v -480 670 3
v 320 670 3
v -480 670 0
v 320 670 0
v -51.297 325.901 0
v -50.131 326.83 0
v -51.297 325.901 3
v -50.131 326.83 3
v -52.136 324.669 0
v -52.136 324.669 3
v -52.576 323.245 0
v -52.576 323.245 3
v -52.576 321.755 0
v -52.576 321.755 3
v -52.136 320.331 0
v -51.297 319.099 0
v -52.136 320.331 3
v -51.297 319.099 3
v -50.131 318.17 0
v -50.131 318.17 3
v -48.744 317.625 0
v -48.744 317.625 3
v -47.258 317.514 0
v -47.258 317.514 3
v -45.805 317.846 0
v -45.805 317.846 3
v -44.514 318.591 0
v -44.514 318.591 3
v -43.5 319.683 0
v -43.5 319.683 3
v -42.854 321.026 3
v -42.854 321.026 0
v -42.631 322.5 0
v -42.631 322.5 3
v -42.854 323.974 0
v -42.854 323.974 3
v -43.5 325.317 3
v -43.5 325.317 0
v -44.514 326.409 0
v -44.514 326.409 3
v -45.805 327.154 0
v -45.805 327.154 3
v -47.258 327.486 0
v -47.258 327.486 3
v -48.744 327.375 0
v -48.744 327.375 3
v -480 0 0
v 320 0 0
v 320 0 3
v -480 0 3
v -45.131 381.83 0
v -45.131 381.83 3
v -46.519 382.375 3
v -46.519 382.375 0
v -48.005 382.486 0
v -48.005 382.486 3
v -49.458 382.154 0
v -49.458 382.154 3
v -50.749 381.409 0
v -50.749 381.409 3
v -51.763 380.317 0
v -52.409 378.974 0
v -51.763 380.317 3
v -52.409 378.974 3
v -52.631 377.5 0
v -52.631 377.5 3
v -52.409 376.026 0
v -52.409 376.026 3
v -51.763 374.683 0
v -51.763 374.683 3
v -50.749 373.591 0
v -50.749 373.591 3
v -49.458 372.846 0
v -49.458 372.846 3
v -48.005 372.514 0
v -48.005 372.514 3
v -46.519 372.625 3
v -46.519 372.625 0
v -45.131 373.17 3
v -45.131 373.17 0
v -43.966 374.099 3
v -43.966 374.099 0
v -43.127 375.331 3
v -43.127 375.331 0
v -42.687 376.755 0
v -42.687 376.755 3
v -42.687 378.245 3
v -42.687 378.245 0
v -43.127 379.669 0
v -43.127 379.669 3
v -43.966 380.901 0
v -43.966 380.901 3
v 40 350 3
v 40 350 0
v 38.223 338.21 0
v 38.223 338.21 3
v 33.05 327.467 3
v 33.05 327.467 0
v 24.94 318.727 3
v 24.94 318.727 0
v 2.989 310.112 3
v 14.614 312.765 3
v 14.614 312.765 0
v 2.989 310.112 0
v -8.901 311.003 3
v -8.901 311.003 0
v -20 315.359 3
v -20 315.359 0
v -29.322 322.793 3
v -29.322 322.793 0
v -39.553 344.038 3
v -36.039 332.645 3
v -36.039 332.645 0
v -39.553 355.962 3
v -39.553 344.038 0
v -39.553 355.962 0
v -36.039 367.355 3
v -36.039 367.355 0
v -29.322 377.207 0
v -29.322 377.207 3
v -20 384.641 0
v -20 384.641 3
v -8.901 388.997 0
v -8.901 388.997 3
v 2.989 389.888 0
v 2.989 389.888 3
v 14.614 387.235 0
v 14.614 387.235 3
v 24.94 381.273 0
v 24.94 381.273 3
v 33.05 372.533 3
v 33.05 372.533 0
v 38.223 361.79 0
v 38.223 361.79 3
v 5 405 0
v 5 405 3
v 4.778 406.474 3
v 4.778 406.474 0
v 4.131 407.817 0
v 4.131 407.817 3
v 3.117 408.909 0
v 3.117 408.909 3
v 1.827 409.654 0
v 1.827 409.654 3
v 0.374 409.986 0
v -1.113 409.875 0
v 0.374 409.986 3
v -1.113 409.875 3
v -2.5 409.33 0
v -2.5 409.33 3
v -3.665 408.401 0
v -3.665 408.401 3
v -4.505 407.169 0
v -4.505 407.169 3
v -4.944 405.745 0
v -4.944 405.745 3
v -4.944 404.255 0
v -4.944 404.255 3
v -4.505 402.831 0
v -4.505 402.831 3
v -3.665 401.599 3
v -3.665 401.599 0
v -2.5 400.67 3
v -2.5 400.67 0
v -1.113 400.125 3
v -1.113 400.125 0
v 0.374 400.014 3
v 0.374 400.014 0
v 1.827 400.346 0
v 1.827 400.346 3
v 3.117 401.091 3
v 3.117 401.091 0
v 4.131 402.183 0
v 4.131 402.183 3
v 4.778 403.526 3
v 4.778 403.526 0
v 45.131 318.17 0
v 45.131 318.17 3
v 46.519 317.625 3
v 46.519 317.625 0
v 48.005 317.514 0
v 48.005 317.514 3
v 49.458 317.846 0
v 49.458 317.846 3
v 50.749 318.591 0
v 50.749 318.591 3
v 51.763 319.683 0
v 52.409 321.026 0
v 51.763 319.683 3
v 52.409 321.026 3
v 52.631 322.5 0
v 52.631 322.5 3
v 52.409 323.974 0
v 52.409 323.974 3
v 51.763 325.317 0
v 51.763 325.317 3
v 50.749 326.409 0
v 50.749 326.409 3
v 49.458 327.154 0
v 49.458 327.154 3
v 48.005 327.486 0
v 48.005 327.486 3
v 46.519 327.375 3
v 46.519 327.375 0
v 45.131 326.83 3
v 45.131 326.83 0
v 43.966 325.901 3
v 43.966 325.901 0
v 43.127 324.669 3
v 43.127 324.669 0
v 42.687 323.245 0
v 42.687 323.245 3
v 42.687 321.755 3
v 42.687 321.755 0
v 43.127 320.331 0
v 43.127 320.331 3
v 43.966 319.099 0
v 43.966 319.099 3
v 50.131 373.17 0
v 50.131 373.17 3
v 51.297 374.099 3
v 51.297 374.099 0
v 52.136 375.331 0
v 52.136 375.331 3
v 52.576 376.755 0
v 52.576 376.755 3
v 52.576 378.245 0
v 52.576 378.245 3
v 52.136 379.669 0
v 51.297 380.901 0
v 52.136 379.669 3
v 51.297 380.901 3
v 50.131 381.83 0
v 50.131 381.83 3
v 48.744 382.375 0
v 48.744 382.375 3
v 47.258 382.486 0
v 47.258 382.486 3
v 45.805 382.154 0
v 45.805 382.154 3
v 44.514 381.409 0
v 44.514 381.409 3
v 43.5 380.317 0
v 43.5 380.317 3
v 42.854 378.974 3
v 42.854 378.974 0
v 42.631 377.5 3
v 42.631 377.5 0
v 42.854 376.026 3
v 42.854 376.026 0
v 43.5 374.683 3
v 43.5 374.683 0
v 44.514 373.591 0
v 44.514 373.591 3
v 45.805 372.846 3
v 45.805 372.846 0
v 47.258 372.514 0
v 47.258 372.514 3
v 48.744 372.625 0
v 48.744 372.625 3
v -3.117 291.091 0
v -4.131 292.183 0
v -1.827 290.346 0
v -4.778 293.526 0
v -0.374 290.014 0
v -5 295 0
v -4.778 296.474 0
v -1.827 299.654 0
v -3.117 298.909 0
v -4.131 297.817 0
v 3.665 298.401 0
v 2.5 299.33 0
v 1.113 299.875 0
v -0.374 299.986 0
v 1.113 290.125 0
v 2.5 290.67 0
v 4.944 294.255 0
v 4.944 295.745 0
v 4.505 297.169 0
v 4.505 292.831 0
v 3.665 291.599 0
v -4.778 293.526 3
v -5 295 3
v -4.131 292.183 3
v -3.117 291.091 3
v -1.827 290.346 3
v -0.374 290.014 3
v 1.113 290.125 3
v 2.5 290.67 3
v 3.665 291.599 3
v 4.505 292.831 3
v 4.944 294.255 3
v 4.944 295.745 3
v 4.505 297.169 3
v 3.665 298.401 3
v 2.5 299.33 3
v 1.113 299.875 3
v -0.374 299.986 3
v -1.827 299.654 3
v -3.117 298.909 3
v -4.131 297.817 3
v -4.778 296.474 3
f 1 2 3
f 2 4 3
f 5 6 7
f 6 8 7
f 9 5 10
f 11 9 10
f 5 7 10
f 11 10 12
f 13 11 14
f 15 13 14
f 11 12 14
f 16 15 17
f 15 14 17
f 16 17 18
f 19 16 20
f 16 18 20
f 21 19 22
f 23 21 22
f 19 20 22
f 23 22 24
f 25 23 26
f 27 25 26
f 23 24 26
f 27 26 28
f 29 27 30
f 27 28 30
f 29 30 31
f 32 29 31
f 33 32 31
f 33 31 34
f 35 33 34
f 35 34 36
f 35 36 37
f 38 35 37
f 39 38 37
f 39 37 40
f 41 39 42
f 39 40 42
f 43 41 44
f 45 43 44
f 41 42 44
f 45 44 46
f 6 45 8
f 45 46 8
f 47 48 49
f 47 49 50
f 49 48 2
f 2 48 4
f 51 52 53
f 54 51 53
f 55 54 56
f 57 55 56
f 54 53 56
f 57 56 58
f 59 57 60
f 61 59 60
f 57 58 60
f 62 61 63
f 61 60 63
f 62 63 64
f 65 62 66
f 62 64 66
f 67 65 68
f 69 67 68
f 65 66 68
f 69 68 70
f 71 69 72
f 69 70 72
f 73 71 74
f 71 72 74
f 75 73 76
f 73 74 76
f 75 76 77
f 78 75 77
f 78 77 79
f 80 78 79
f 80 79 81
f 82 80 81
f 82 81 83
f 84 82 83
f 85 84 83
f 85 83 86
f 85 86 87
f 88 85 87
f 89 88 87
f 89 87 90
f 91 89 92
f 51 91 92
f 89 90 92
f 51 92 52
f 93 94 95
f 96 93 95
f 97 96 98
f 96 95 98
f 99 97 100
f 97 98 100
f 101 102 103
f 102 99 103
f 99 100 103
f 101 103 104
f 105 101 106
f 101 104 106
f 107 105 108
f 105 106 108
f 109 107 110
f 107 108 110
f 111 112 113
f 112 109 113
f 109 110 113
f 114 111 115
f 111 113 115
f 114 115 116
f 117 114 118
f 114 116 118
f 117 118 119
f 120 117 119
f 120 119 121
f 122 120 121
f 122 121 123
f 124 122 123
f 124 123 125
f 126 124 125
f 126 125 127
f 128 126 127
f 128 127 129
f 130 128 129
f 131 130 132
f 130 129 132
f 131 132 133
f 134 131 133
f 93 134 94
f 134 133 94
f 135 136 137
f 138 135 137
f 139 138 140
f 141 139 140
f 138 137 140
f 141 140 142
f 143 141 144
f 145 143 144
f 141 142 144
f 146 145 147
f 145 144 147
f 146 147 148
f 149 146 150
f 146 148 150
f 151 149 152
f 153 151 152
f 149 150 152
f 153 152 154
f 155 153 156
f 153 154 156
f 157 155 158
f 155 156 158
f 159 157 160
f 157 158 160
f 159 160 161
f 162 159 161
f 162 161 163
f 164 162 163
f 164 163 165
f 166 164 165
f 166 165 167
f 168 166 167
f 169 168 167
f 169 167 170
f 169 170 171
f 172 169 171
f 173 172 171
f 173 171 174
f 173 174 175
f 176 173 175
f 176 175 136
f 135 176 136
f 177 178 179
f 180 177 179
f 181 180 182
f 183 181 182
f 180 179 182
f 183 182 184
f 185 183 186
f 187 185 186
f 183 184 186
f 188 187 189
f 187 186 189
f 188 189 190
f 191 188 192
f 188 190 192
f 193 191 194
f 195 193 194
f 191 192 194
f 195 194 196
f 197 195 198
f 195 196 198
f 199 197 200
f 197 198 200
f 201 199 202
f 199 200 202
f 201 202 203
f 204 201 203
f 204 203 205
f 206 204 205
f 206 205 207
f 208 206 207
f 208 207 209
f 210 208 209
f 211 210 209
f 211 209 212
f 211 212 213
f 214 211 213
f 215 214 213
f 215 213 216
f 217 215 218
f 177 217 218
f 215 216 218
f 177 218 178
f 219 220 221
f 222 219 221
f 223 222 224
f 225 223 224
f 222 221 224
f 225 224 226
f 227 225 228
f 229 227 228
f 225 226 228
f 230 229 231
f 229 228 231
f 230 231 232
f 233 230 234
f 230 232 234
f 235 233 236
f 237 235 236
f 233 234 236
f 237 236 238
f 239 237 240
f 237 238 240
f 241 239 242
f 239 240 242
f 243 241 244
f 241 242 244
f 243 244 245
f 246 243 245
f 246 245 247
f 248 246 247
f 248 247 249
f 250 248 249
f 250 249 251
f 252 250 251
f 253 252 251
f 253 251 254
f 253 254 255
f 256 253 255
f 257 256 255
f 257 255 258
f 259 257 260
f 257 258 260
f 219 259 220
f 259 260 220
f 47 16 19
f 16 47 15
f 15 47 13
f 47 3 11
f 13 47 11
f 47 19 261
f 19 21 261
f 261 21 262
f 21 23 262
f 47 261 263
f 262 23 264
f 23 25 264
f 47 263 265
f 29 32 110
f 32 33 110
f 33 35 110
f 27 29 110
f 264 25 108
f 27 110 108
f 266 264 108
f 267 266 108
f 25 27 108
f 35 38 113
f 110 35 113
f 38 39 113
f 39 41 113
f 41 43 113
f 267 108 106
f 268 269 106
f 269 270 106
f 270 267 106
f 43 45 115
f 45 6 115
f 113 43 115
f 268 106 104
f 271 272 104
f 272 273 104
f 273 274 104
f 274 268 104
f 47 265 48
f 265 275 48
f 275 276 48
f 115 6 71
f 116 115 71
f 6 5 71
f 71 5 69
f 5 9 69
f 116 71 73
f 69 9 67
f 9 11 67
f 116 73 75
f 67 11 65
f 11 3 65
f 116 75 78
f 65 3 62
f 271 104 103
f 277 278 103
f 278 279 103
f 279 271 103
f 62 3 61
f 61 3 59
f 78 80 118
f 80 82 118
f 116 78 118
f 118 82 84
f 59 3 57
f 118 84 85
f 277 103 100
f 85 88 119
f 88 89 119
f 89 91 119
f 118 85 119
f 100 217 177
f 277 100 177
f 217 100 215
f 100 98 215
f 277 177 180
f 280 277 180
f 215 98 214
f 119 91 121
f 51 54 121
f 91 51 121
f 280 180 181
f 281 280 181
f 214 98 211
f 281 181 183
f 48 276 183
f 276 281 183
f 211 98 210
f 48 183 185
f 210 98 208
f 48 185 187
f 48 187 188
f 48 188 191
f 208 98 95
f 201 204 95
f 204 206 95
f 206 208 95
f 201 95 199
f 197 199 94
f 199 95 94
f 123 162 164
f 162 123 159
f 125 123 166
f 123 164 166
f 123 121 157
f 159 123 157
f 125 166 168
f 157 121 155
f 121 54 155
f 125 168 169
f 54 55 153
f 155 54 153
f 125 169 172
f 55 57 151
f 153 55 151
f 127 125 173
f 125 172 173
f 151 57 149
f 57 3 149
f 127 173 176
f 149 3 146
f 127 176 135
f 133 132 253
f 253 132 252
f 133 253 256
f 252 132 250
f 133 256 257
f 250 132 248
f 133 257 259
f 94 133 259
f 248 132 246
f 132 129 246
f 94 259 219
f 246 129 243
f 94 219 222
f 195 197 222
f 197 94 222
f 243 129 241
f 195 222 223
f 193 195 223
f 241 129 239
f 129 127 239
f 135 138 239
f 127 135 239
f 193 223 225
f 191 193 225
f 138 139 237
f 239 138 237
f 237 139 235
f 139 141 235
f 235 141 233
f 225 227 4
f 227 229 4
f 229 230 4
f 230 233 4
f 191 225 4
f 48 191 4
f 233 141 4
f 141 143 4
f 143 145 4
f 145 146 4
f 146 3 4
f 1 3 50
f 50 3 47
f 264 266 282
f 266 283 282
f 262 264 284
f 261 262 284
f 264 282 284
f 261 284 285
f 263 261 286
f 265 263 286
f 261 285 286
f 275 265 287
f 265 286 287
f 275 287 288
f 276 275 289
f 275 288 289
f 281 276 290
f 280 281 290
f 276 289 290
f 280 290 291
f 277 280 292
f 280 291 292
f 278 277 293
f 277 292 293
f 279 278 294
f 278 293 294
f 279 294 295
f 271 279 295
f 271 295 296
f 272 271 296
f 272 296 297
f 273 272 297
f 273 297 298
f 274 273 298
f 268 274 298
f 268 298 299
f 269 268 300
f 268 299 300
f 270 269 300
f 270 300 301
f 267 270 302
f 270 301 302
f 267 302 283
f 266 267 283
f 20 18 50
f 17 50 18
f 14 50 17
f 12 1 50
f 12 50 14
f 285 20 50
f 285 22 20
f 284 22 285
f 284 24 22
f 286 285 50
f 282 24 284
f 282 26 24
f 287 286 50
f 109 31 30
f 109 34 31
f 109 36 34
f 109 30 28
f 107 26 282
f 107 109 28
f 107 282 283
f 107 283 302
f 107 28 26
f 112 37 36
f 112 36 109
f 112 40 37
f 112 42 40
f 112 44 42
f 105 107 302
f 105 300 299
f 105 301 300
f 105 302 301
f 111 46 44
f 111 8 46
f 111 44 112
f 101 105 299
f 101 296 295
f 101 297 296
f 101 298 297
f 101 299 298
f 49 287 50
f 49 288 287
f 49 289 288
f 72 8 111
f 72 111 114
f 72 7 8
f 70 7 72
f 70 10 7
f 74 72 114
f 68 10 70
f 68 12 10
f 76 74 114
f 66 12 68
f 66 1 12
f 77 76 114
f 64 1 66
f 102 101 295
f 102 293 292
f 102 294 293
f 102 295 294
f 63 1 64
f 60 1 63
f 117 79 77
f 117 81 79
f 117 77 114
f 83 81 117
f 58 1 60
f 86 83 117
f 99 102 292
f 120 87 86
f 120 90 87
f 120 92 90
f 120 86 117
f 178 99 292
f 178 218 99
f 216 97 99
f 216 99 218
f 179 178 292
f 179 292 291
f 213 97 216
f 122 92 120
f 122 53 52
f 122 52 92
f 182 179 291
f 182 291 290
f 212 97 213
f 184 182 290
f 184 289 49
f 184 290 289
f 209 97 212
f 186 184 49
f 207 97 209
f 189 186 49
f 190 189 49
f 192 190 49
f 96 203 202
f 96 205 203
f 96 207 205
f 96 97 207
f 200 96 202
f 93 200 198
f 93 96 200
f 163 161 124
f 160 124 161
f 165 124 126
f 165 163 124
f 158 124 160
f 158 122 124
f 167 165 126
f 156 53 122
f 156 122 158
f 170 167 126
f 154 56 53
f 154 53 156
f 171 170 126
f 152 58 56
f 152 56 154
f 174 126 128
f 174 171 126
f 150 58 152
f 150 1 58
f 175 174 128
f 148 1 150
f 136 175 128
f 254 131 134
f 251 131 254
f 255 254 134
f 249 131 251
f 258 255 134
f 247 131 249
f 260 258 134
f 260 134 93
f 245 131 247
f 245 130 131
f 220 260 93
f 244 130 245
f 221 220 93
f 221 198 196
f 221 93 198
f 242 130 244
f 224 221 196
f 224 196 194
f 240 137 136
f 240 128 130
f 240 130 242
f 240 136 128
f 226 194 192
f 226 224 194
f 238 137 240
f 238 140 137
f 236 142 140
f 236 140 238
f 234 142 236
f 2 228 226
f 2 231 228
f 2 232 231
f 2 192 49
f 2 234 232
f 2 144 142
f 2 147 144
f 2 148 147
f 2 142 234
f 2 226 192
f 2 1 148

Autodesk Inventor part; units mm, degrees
ref_plane "YZ Plane" through (0, 0, 0) normal (1, 0, 0) x (0, 1, 0)
ref_plane "XZ Plane" through (0, 0, 0) normal (0, 1, 0) x (-1, 0, 0)
ref_plane "XY Plane" through (0, 0, 0) normal (0, 0, 1) x (1, 0, 0)
sketch "Sketch1" plane through (0, 0, 0) normal (0, 0, 1) x (1, 0, 0)
  line L0 (320, 0) -> (320, 670)
  line L1 (320, 670) -> (-480, 670)
  line L2 (-480, 670) -> (-480, 0)
  circle A0 centre (0, 350) radius 40
  line L3 (320, 0) -> (-480, 0)
  point P0 (0, 0)
  dimension "d14" = 80
  dimension "d15" = 320
  dimension "d17" = 320
  dimension "d26" = 800
  dimension "d27" = 670
extrude "Plate1" add sketch "Sketch1" along normal blind 3
sketch "Sketch2" plane through (0, 0, 0) normal (0, 0, -1) x (-1, 0, 0)
  line L0 (-300, 650) -> (-100, 650) construction
  line L1 (-100, 650) -> (-100, 630) construction
  line L2 (-100, 630) -> (-300, 630) construction
  line L3 (-300, 630) -> (-300, 650) construction
  line L4 (-320, 670) -> (480, 670) projected
  line L5 (-320, 0) -> (-320, 670) projected
  point P0 (0, 0)
  point P1 (-48, 100)
  point P2 (480, 670)
  point P3 (-251, -525)
  point P4 (-50, 98)
  point P5 (-320, 0)
  dimension "d6" = 200
  dimension "d9" = 20
  dimension "d10" = 20
  dimension "d11" = 20
mark "Mark1"
sketch "Sketch3" plane through (0, 0, 3) normal (0, 0, 1) x (1, 0, 0)
  circle A0 centre (0, 405) radius 5
  circle A1 centre (0, 350) radius 40 projected
  point P0 (0, 0)
  dimension "d19" = 10
  dimension "d20" = 55
extrude "Cut1" cut sketch "Sketch3" against normal through all contours A0
pattern_circular "Circular Pattern1" count 6 over 360 about axis through (0, 350, 0) along (0, 0, 1) of "Cut1"
equation "\"d2\" = Thickness"
equation "\"BendReliefWidth\" = Thickness"
equation "\"BendReliefDepth\" = 0.5 * Thickness"
equation "\"CornerReliefSize\" = 4 * Thickness"
equation "\"MinimumRemnant\" = 2 * Thickness"
equation "\"TransitionRadius\" = BendRadius"
equation "\"JacobiRadiusSize\" = BendRadius"
equation "\"GapSize\" = Thickness"
equation "\"Thickness\" = 3"
equation "\"BendRadius\" = 2.75"
properties part number "TRM 015 left board main" material "AISI 304"
